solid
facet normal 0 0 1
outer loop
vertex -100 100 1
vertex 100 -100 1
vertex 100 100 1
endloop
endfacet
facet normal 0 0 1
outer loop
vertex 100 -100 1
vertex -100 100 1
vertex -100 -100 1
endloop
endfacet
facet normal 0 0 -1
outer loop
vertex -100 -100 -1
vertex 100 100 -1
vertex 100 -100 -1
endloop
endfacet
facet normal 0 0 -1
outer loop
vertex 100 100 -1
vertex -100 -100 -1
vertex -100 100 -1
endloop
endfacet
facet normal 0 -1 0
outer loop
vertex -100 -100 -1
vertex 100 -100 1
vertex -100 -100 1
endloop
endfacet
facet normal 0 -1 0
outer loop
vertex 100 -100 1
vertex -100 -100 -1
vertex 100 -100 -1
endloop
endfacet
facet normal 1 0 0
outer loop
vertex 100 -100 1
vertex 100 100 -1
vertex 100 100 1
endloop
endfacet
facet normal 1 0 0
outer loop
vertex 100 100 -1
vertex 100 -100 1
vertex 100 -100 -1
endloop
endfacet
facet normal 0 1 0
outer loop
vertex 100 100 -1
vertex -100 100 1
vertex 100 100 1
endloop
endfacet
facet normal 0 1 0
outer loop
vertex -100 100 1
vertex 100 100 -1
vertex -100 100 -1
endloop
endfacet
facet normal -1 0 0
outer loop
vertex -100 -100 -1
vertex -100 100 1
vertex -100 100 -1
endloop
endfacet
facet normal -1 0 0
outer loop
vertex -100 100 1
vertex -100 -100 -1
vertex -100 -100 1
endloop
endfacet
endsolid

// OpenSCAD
// Parameters
sheet_length = 200; //[100:400:1]
sheet_width  = 200; //[100:400:1]
sheet_thickness = 2; //[1:4:0.5]

// Robust minimum thickness to avoid "blank" renders (coplanar/too-thin issues)
min_t = 0.5;
t = max(sheet_thickness, min_t);

// Geometry (one connected solid)
color([0.85, 0.85, 0.8])
    cube([sheet_length, sheet_width, t], center=true);
